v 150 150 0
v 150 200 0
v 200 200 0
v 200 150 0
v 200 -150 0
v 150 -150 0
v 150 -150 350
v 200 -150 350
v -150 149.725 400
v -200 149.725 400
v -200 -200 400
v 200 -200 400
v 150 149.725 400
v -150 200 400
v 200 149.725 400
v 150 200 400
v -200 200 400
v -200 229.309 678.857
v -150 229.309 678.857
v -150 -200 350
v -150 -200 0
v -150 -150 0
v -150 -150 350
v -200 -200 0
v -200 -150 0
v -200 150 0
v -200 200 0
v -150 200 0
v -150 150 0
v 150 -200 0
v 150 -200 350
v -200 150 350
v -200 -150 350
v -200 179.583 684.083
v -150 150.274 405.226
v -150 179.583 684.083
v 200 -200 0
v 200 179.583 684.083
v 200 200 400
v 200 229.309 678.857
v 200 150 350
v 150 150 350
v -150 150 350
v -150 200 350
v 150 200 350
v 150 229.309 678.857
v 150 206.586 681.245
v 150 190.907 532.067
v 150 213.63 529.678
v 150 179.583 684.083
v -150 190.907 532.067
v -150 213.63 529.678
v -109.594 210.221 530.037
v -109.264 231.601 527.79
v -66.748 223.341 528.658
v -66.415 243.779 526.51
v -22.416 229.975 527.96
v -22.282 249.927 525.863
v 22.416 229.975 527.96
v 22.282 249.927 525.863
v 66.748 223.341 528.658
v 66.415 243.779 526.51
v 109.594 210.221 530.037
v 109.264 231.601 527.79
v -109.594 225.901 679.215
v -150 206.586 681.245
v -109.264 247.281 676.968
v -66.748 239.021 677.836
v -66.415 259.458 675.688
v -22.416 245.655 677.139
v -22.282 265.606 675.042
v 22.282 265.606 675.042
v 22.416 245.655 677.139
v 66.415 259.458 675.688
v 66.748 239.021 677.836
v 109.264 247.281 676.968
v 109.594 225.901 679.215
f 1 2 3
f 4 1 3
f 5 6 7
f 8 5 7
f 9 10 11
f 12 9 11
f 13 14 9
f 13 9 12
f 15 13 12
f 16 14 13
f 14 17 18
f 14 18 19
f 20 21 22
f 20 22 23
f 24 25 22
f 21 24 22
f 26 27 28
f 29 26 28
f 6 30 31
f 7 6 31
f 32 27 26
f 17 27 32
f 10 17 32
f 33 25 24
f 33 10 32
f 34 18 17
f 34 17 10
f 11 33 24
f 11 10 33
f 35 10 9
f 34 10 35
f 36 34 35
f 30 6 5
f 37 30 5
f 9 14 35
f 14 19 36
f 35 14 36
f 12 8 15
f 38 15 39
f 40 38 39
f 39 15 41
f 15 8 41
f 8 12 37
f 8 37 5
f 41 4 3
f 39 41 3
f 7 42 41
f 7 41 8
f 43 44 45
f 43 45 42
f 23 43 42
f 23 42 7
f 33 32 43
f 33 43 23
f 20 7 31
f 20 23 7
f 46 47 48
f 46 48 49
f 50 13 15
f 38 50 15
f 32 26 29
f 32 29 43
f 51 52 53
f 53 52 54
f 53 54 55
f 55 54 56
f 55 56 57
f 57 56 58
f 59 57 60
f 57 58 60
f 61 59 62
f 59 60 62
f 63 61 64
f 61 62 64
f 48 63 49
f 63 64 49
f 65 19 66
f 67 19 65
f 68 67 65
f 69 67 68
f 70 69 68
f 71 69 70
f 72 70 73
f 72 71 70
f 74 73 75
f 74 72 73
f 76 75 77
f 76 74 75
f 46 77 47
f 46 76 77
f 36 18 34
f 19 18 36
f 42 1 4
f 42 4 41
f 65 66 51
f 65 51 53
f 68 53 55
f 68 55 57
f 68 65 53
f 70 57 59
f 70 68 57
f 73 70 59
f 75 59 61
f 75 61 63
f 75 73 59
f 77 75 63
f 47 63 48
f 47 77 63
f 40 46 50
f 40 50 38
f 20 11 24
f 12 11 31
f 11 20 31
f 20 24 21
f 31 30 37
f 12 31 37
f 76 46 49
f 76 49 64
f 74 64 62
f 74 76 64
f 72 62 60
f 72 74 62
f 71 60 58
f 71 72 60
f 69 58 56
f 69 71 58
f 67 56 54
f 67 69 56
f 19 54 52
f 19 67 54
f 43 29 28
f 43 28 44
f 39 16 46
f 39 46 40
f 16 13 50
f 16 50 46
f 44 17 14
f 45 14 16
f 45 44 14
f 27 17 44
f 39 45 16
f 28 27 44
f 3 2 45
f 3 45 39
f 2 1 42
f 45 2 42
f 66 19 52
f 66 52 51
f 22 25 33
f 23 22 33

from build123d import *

# Parameters (mm, degrees)
F0_W       = 400
F0_H       = 400
F1_DEPTH   = 400
F2_W       = 300
F2_H       = 350
F3_DEPTH   = 400.001
F4_W       = 300
F4_H       = 350
F5_DEPTH   = 400.001
F9_W       = 400
F9_H       = 280.3927361965
F10_DEPTH  = 50
F11_W      = 300
F11_H      = 280.3927361965
F12_DEPTH  = 120.9608492449
F15_DEPTH  = 150
F16_DEPTH  = 5.2552117633
F12_FACE_W = 50
F12_FACE_H = 50


with BuildPart() as f1:
    # F0 (on Top) → F1 (new body)
    with BuildSketch(Plane.XY):
        Rectangle(F0_W, F0_H)
    extrude(amount=F1_DEPTH)

    # F2 (on face) → F3 (cut, through all)
    with BuildSketch(Plane.XZ.offset(200)):
        with Locations((0, 175)):
            Rectangle(F2_W, F2_H)
    extrude(amount=-F3_DEPTH, mode=Mode.SUBTRACT)

    # F4 (on face) → F5 (cut, through all)
    with BuildSketch(Plane(origin=(-200, 0, 0), x_dir=(0, -1, 0), z_dir=(-1, 0, 0))):
        with Locations((0, 175)):
            Rectangle(F4_W, F4_H)
    extrude(amount=-F5_DEPTH, mode=Mode.SUBTRACT)



with BuildPart() as f10:
    # F9 (on line) → F10 (new body)
    with BuildSketch(Plane(origin=(0, 156.2324219098, -16.4206892285), x_dir=(1, 0, 0), z_dir=(0, -0.9945218954, 0.1045284633))):
        with Locations((0, 558.9108188991)):
            Rectangle(F9_W, F9_H)
    extrude(amount=F10_DEPTH)

    # F11 (on face) → F12 (cut, through all)
    with BuildSketch(Plane(origin=(0, 106.5063271414, -11.1942660652), x_dir=(1, 0, 0), z_dir=(0, -0.9945218954, 0.1045284633))):
        with Locations((0, 558.9108188991)):
            Rectangle(F11_W, F11_H)
    extrude(amount=-F12_DEPTH, mode=Mode.SUBTRACT)


with BuildPart() as f15:
    # F14 (on offset) → F15 (new body)
    with BuildSketch(Plane(origin=(0, 73.0765999162, 695.2774046782), x_dir=(1, 0, 0), z_dir=(0, 0.1045284633, 0.9945218954))):
        with BuildLine():
            Line((150, 134.2451988675), (150, 157.0929937666))
            ThreePointArc((150, 157.0929937666), (0, 194.3659435427), (-150, 157.0929937666))
            Line((-150, 157.0929937666), (-150, 134.2451988675))
            ThreePointArc((-150, 134.2451988675), (0, 174.3659435427), (150, 134.2451988675))
        make_face()
    extrude(amount=-F15_DEPTH)


with BuildPart() as f1_1:
    add(f1.part)
    # F16 (add, through all): a face of the model
    f16_faces = [f10.part.faces().sort_by_distance(p)[0] for p in [
        (175, 175.1369526158, 402.6132115817),
    ]]

    add(f10.part)  # F16 merges F10
    extrude(f16_faces, amount=F16_DEPTH)

    # F12_face (on face) → F17 (join, up to the next surface of F1)
    with BuildSketch(Plane(origin=(175, 175.1369526158, 402.6132115817), x_dir=(1, 0, 0), z_dir=(0, -0.1045284633, -0.9945218954))):
        with Locations((-350, 0)):
            Rectangle(F12_FACE_W, F12_FACE_H)
    extrude(until=Until.NEXT)


solid = Compound([f15.part, f1_1.part])
